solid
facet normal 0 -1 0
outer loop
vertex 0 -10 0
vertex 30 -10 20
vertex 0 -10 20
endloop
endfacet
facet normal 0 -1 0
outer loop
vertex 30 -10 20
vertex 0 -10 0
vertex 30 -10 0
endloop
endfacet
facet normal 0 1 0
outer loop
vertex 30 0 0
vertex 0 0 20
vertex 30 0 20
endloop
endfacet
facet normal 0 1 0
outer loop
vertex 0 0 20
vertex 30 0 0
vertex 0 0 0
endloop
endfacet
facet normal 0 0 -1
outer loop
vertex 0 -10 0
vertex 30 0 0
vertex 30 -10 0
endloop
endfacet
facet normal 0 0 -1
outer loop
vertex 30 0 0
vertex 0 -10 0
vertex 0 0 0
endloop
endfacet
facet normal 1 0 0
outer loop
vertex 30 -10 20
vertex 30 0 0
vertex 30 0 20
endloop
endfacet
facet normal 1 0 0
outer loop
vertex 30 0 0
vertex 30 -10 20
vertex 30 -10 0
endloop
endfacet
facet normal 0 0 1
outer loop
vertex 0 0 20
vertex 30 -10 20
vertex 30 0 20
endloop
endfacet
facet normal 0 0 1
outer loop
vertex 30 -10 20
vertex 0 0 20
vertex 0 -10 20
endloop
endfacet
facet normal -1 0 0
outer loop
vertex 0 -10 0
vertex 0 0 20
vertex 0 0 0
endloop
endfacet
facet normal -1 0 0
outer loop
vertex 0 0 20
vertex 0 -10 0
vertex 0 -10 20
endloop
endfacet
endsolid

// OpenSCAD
rotate([90, 0, 0]) cube([30, 20, 10]);
%cube([30, 20, 10]);
